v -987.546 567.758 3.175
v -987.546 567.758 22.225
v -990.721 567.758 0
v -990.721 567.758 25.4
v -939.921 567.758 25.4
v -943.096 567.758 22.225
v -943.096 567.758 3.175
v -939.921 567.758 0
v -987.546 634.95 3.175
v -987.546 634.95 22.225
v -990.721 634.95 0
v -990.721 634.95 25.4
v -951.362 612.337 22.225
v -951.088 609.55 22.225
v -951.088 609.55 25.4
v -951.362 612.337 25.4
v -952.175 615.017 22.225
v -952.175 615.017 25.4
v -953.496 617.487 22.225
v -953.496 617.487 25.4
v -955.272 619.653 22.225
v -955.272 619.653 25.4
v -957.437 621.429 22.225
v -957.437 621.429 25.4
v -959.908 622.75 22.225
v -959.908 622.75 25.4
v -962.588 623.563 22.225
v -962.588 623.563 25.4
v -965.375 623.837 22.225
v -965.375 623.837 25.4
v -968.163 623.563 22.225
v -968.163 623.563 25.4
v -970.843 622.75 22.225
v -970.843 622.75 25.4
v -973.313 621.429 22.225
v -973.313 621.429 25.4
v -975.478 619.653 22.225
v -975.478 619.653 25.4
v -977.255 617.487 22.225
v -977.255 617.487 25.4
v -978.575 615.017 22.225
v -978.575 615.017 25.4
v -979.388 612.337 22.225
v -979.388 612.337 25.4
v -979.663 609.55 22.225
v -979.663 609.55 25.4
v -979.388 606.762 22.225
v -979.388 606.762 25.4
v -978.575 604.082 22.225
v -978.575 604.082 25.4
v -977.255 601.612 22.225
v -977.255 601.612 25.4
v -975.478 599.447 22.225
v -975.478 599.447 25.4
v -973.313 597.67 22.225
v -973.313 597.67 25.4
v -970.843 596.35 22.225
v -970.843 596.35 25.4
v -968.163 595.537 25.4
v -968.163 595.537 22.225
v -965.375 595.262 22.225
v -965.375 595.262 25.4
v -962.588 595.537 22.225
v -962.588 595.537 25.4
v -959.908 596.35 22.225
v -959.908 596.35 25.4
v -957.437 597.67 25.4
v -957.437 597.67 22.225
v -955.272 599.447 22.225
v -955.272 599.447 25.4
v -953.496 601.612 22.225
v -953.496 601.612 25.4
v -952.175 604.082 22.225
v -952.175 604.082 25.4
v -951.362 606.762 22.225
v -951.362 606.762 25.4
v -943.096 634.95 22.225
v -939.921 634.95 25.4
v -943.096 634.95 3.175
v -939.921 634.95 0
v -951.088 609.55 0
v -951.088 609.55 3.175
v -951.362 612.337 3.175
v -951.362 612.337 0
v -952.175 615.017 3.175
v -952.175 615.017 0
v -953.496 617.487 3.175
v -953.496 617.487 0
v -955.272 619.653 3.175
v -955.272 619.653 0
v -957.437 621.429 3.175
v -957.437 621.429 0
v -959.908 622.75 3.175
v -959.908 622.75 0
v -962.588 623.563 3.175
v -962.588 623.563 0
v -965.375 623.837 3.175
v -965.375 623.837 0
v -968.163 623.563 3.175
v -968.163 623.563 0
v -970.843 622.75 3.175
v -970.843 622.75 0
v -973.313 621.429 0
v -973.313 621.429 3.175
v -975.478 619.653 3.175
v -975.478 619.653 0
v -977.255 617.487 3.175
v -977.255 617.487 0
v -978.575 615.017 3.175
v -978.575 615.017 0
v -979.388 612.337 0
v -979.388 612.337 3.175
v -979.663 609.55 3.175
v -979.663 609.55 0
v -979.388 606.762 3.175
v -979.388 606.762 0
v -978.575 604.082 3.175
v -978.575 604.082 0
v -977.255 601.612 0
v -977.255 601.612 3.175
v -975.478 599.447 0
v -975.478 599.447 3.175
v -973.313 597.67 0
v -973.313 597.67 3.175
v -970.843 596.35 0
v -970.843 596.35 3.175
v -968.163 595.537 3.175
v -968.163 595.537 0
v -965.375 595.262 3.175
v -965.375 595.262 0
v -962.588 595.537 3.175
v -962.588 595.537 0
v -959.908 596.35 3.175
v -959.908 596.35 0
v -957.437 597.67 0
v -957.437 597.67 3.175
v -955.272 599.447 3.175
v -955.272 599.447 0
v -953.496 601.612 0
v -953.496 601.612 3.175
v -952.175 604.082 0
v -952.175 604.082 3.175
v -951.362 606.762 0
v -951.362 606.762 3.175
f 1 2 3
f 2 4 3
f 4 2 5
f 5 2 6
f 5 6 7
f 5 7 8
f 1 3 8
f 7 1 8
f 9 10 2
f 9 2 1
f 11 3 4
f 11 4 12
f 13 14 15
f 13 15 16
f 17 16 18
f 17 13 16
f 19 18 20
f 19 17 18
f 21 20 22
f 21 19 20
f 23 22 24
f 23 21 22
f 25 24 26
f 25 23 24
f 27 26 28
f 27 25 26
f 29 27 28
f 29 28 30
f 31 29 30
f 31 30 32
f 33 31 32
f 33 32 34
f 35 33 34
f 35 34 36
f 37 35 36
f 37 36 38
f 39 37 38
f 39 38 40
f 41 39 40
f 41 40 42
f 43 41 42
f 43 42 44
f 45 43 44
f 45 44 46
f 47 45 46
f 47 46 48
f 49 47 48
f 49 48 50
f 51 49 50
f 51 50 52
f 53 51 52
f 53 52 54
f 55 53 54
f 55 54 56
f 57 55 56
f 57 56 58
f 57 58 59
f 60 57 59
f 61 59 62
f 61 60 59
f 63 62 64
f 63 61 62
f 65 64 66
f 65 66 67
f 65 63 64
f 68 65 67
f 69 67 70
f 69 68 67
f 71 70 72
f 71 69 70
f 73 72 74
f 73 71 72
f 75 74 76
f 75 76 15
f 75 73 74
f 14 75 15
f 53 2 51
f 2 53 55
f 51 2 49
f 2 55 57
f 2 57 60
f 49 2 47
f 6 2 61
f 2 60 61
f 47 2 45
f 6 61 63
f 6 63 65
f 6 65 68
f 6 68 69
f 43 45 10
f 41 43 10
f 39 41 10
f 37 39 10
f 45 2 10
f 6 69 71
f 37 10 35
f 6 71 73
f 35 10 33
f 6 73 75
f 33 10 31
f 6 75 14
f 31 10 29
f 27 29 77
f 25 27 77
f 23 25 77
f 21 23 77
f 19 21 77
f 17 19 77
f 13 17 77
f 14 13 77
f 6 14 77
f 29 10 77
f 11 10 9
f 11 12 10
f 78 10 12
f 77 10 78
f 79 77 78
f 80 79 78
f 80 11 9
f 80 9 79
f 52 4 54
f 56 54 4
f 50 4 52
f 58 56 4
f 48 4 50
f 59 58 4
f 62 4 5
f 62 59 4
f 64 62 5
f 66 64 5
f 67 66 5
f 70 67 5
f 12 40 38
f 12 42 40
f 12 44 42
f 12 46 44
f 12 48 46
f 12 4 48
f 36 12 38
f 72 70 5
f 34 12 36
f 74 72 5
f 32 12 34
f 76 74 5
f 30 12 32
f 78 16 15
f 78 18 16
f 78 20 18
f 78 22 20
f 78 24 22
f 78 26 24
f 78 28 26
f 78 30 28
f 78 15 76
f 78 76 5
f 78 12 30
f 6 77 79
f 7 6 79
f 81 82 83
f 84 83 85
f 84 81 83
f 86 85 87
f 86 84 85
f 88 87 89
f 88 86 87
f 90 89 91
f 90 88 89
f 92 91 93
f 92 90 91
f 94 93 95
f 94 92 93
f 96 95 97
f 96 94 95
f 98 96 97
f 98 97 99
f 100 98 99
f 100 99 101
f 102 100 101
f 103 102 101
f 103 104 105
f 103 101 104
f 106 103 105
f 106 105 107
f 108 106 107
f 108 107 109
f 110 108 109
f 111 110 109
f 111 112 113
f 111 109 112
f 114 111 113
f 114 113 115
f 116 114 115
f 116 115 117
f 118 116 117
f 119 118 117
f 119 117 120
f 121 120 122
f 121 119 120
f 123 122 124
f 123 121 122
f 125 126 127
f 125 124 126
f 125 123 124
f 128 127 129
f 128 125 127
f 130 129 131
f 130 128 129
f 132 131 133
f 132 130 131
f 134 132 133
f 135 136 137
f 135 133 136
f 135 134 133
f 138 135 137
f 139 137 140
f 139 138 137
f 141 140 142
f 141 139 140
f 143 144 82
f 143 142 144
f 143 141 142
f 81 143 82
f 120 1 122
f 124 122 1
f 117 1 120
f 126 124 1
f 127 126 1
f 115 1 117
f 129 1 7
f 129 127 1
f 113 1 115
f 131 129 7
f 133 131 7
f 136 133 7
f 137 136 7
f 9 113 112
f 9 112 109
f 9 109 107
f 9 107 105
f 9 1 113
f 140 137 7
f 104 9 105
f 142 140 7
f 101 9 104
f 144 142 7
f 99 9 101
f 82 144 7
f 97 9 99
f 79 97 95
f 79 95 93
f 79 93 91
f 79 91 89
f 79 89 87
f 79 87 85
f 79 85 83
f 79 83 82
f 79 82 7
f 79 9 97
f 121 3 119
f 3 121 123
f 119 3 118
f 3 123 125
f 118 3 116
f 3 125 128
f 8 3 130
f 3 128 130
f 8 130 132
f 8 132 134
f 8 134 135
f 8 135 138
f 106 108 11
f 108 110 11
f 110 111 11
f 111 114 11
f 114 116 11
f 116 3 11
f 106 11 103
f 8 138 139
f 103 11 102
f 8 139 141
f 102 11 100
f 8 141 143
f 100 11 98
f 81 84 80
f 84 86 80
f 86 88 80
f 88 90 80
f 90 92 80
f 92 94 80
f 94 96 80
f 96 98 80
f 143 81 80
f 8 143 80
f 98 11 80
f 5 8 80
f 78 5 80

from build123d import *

# Parameters (mm, degrees)
SKETCH1_W           = 50.8
SKETCH1_H           = 67.192198053
SKETCH1_R           = 14.2875
BOSS_EXTRUDE1_DEPTH = 25.4
SKETCH2_W           = 44.45
SKETCH2_H           = 19.05
CUT_EXTRUDE1_DEPTH  = 994.32138208


with BuildPart() as part:
    # Sketch1 → Boss-Extrude1 (new body)
    with BuildSketch(Plane.XY):
        with Locations((-965.320655189, 601.353631034)):
            Rectangle(SKETCH1_W, SKETCH1_H)
        with Locations((-965.375181631, 609.54973006)):
            Circle(SKETCH1_R, mode=Mode.SUBTRACT)
    extrude(amount=BOSS_EXTRUDE1_DEPTH)

    # Sketch2 → Cut-Extrude1 (cut, through all)
    with BuildSketch(Plane(origin=(0, 634.94973006, 0), x_dir=(1, 0, 0), z_dir=(0, 1, 0))):
        with Locations((-965.320655189, -12.7)):
            Rectangle(SKETCH2_W, SKETCH2_H)
    extrude(amount=-CUT_EXTRUDE1_DEPTH, mode=Mode.SUBTRACT)


solid = part.part
